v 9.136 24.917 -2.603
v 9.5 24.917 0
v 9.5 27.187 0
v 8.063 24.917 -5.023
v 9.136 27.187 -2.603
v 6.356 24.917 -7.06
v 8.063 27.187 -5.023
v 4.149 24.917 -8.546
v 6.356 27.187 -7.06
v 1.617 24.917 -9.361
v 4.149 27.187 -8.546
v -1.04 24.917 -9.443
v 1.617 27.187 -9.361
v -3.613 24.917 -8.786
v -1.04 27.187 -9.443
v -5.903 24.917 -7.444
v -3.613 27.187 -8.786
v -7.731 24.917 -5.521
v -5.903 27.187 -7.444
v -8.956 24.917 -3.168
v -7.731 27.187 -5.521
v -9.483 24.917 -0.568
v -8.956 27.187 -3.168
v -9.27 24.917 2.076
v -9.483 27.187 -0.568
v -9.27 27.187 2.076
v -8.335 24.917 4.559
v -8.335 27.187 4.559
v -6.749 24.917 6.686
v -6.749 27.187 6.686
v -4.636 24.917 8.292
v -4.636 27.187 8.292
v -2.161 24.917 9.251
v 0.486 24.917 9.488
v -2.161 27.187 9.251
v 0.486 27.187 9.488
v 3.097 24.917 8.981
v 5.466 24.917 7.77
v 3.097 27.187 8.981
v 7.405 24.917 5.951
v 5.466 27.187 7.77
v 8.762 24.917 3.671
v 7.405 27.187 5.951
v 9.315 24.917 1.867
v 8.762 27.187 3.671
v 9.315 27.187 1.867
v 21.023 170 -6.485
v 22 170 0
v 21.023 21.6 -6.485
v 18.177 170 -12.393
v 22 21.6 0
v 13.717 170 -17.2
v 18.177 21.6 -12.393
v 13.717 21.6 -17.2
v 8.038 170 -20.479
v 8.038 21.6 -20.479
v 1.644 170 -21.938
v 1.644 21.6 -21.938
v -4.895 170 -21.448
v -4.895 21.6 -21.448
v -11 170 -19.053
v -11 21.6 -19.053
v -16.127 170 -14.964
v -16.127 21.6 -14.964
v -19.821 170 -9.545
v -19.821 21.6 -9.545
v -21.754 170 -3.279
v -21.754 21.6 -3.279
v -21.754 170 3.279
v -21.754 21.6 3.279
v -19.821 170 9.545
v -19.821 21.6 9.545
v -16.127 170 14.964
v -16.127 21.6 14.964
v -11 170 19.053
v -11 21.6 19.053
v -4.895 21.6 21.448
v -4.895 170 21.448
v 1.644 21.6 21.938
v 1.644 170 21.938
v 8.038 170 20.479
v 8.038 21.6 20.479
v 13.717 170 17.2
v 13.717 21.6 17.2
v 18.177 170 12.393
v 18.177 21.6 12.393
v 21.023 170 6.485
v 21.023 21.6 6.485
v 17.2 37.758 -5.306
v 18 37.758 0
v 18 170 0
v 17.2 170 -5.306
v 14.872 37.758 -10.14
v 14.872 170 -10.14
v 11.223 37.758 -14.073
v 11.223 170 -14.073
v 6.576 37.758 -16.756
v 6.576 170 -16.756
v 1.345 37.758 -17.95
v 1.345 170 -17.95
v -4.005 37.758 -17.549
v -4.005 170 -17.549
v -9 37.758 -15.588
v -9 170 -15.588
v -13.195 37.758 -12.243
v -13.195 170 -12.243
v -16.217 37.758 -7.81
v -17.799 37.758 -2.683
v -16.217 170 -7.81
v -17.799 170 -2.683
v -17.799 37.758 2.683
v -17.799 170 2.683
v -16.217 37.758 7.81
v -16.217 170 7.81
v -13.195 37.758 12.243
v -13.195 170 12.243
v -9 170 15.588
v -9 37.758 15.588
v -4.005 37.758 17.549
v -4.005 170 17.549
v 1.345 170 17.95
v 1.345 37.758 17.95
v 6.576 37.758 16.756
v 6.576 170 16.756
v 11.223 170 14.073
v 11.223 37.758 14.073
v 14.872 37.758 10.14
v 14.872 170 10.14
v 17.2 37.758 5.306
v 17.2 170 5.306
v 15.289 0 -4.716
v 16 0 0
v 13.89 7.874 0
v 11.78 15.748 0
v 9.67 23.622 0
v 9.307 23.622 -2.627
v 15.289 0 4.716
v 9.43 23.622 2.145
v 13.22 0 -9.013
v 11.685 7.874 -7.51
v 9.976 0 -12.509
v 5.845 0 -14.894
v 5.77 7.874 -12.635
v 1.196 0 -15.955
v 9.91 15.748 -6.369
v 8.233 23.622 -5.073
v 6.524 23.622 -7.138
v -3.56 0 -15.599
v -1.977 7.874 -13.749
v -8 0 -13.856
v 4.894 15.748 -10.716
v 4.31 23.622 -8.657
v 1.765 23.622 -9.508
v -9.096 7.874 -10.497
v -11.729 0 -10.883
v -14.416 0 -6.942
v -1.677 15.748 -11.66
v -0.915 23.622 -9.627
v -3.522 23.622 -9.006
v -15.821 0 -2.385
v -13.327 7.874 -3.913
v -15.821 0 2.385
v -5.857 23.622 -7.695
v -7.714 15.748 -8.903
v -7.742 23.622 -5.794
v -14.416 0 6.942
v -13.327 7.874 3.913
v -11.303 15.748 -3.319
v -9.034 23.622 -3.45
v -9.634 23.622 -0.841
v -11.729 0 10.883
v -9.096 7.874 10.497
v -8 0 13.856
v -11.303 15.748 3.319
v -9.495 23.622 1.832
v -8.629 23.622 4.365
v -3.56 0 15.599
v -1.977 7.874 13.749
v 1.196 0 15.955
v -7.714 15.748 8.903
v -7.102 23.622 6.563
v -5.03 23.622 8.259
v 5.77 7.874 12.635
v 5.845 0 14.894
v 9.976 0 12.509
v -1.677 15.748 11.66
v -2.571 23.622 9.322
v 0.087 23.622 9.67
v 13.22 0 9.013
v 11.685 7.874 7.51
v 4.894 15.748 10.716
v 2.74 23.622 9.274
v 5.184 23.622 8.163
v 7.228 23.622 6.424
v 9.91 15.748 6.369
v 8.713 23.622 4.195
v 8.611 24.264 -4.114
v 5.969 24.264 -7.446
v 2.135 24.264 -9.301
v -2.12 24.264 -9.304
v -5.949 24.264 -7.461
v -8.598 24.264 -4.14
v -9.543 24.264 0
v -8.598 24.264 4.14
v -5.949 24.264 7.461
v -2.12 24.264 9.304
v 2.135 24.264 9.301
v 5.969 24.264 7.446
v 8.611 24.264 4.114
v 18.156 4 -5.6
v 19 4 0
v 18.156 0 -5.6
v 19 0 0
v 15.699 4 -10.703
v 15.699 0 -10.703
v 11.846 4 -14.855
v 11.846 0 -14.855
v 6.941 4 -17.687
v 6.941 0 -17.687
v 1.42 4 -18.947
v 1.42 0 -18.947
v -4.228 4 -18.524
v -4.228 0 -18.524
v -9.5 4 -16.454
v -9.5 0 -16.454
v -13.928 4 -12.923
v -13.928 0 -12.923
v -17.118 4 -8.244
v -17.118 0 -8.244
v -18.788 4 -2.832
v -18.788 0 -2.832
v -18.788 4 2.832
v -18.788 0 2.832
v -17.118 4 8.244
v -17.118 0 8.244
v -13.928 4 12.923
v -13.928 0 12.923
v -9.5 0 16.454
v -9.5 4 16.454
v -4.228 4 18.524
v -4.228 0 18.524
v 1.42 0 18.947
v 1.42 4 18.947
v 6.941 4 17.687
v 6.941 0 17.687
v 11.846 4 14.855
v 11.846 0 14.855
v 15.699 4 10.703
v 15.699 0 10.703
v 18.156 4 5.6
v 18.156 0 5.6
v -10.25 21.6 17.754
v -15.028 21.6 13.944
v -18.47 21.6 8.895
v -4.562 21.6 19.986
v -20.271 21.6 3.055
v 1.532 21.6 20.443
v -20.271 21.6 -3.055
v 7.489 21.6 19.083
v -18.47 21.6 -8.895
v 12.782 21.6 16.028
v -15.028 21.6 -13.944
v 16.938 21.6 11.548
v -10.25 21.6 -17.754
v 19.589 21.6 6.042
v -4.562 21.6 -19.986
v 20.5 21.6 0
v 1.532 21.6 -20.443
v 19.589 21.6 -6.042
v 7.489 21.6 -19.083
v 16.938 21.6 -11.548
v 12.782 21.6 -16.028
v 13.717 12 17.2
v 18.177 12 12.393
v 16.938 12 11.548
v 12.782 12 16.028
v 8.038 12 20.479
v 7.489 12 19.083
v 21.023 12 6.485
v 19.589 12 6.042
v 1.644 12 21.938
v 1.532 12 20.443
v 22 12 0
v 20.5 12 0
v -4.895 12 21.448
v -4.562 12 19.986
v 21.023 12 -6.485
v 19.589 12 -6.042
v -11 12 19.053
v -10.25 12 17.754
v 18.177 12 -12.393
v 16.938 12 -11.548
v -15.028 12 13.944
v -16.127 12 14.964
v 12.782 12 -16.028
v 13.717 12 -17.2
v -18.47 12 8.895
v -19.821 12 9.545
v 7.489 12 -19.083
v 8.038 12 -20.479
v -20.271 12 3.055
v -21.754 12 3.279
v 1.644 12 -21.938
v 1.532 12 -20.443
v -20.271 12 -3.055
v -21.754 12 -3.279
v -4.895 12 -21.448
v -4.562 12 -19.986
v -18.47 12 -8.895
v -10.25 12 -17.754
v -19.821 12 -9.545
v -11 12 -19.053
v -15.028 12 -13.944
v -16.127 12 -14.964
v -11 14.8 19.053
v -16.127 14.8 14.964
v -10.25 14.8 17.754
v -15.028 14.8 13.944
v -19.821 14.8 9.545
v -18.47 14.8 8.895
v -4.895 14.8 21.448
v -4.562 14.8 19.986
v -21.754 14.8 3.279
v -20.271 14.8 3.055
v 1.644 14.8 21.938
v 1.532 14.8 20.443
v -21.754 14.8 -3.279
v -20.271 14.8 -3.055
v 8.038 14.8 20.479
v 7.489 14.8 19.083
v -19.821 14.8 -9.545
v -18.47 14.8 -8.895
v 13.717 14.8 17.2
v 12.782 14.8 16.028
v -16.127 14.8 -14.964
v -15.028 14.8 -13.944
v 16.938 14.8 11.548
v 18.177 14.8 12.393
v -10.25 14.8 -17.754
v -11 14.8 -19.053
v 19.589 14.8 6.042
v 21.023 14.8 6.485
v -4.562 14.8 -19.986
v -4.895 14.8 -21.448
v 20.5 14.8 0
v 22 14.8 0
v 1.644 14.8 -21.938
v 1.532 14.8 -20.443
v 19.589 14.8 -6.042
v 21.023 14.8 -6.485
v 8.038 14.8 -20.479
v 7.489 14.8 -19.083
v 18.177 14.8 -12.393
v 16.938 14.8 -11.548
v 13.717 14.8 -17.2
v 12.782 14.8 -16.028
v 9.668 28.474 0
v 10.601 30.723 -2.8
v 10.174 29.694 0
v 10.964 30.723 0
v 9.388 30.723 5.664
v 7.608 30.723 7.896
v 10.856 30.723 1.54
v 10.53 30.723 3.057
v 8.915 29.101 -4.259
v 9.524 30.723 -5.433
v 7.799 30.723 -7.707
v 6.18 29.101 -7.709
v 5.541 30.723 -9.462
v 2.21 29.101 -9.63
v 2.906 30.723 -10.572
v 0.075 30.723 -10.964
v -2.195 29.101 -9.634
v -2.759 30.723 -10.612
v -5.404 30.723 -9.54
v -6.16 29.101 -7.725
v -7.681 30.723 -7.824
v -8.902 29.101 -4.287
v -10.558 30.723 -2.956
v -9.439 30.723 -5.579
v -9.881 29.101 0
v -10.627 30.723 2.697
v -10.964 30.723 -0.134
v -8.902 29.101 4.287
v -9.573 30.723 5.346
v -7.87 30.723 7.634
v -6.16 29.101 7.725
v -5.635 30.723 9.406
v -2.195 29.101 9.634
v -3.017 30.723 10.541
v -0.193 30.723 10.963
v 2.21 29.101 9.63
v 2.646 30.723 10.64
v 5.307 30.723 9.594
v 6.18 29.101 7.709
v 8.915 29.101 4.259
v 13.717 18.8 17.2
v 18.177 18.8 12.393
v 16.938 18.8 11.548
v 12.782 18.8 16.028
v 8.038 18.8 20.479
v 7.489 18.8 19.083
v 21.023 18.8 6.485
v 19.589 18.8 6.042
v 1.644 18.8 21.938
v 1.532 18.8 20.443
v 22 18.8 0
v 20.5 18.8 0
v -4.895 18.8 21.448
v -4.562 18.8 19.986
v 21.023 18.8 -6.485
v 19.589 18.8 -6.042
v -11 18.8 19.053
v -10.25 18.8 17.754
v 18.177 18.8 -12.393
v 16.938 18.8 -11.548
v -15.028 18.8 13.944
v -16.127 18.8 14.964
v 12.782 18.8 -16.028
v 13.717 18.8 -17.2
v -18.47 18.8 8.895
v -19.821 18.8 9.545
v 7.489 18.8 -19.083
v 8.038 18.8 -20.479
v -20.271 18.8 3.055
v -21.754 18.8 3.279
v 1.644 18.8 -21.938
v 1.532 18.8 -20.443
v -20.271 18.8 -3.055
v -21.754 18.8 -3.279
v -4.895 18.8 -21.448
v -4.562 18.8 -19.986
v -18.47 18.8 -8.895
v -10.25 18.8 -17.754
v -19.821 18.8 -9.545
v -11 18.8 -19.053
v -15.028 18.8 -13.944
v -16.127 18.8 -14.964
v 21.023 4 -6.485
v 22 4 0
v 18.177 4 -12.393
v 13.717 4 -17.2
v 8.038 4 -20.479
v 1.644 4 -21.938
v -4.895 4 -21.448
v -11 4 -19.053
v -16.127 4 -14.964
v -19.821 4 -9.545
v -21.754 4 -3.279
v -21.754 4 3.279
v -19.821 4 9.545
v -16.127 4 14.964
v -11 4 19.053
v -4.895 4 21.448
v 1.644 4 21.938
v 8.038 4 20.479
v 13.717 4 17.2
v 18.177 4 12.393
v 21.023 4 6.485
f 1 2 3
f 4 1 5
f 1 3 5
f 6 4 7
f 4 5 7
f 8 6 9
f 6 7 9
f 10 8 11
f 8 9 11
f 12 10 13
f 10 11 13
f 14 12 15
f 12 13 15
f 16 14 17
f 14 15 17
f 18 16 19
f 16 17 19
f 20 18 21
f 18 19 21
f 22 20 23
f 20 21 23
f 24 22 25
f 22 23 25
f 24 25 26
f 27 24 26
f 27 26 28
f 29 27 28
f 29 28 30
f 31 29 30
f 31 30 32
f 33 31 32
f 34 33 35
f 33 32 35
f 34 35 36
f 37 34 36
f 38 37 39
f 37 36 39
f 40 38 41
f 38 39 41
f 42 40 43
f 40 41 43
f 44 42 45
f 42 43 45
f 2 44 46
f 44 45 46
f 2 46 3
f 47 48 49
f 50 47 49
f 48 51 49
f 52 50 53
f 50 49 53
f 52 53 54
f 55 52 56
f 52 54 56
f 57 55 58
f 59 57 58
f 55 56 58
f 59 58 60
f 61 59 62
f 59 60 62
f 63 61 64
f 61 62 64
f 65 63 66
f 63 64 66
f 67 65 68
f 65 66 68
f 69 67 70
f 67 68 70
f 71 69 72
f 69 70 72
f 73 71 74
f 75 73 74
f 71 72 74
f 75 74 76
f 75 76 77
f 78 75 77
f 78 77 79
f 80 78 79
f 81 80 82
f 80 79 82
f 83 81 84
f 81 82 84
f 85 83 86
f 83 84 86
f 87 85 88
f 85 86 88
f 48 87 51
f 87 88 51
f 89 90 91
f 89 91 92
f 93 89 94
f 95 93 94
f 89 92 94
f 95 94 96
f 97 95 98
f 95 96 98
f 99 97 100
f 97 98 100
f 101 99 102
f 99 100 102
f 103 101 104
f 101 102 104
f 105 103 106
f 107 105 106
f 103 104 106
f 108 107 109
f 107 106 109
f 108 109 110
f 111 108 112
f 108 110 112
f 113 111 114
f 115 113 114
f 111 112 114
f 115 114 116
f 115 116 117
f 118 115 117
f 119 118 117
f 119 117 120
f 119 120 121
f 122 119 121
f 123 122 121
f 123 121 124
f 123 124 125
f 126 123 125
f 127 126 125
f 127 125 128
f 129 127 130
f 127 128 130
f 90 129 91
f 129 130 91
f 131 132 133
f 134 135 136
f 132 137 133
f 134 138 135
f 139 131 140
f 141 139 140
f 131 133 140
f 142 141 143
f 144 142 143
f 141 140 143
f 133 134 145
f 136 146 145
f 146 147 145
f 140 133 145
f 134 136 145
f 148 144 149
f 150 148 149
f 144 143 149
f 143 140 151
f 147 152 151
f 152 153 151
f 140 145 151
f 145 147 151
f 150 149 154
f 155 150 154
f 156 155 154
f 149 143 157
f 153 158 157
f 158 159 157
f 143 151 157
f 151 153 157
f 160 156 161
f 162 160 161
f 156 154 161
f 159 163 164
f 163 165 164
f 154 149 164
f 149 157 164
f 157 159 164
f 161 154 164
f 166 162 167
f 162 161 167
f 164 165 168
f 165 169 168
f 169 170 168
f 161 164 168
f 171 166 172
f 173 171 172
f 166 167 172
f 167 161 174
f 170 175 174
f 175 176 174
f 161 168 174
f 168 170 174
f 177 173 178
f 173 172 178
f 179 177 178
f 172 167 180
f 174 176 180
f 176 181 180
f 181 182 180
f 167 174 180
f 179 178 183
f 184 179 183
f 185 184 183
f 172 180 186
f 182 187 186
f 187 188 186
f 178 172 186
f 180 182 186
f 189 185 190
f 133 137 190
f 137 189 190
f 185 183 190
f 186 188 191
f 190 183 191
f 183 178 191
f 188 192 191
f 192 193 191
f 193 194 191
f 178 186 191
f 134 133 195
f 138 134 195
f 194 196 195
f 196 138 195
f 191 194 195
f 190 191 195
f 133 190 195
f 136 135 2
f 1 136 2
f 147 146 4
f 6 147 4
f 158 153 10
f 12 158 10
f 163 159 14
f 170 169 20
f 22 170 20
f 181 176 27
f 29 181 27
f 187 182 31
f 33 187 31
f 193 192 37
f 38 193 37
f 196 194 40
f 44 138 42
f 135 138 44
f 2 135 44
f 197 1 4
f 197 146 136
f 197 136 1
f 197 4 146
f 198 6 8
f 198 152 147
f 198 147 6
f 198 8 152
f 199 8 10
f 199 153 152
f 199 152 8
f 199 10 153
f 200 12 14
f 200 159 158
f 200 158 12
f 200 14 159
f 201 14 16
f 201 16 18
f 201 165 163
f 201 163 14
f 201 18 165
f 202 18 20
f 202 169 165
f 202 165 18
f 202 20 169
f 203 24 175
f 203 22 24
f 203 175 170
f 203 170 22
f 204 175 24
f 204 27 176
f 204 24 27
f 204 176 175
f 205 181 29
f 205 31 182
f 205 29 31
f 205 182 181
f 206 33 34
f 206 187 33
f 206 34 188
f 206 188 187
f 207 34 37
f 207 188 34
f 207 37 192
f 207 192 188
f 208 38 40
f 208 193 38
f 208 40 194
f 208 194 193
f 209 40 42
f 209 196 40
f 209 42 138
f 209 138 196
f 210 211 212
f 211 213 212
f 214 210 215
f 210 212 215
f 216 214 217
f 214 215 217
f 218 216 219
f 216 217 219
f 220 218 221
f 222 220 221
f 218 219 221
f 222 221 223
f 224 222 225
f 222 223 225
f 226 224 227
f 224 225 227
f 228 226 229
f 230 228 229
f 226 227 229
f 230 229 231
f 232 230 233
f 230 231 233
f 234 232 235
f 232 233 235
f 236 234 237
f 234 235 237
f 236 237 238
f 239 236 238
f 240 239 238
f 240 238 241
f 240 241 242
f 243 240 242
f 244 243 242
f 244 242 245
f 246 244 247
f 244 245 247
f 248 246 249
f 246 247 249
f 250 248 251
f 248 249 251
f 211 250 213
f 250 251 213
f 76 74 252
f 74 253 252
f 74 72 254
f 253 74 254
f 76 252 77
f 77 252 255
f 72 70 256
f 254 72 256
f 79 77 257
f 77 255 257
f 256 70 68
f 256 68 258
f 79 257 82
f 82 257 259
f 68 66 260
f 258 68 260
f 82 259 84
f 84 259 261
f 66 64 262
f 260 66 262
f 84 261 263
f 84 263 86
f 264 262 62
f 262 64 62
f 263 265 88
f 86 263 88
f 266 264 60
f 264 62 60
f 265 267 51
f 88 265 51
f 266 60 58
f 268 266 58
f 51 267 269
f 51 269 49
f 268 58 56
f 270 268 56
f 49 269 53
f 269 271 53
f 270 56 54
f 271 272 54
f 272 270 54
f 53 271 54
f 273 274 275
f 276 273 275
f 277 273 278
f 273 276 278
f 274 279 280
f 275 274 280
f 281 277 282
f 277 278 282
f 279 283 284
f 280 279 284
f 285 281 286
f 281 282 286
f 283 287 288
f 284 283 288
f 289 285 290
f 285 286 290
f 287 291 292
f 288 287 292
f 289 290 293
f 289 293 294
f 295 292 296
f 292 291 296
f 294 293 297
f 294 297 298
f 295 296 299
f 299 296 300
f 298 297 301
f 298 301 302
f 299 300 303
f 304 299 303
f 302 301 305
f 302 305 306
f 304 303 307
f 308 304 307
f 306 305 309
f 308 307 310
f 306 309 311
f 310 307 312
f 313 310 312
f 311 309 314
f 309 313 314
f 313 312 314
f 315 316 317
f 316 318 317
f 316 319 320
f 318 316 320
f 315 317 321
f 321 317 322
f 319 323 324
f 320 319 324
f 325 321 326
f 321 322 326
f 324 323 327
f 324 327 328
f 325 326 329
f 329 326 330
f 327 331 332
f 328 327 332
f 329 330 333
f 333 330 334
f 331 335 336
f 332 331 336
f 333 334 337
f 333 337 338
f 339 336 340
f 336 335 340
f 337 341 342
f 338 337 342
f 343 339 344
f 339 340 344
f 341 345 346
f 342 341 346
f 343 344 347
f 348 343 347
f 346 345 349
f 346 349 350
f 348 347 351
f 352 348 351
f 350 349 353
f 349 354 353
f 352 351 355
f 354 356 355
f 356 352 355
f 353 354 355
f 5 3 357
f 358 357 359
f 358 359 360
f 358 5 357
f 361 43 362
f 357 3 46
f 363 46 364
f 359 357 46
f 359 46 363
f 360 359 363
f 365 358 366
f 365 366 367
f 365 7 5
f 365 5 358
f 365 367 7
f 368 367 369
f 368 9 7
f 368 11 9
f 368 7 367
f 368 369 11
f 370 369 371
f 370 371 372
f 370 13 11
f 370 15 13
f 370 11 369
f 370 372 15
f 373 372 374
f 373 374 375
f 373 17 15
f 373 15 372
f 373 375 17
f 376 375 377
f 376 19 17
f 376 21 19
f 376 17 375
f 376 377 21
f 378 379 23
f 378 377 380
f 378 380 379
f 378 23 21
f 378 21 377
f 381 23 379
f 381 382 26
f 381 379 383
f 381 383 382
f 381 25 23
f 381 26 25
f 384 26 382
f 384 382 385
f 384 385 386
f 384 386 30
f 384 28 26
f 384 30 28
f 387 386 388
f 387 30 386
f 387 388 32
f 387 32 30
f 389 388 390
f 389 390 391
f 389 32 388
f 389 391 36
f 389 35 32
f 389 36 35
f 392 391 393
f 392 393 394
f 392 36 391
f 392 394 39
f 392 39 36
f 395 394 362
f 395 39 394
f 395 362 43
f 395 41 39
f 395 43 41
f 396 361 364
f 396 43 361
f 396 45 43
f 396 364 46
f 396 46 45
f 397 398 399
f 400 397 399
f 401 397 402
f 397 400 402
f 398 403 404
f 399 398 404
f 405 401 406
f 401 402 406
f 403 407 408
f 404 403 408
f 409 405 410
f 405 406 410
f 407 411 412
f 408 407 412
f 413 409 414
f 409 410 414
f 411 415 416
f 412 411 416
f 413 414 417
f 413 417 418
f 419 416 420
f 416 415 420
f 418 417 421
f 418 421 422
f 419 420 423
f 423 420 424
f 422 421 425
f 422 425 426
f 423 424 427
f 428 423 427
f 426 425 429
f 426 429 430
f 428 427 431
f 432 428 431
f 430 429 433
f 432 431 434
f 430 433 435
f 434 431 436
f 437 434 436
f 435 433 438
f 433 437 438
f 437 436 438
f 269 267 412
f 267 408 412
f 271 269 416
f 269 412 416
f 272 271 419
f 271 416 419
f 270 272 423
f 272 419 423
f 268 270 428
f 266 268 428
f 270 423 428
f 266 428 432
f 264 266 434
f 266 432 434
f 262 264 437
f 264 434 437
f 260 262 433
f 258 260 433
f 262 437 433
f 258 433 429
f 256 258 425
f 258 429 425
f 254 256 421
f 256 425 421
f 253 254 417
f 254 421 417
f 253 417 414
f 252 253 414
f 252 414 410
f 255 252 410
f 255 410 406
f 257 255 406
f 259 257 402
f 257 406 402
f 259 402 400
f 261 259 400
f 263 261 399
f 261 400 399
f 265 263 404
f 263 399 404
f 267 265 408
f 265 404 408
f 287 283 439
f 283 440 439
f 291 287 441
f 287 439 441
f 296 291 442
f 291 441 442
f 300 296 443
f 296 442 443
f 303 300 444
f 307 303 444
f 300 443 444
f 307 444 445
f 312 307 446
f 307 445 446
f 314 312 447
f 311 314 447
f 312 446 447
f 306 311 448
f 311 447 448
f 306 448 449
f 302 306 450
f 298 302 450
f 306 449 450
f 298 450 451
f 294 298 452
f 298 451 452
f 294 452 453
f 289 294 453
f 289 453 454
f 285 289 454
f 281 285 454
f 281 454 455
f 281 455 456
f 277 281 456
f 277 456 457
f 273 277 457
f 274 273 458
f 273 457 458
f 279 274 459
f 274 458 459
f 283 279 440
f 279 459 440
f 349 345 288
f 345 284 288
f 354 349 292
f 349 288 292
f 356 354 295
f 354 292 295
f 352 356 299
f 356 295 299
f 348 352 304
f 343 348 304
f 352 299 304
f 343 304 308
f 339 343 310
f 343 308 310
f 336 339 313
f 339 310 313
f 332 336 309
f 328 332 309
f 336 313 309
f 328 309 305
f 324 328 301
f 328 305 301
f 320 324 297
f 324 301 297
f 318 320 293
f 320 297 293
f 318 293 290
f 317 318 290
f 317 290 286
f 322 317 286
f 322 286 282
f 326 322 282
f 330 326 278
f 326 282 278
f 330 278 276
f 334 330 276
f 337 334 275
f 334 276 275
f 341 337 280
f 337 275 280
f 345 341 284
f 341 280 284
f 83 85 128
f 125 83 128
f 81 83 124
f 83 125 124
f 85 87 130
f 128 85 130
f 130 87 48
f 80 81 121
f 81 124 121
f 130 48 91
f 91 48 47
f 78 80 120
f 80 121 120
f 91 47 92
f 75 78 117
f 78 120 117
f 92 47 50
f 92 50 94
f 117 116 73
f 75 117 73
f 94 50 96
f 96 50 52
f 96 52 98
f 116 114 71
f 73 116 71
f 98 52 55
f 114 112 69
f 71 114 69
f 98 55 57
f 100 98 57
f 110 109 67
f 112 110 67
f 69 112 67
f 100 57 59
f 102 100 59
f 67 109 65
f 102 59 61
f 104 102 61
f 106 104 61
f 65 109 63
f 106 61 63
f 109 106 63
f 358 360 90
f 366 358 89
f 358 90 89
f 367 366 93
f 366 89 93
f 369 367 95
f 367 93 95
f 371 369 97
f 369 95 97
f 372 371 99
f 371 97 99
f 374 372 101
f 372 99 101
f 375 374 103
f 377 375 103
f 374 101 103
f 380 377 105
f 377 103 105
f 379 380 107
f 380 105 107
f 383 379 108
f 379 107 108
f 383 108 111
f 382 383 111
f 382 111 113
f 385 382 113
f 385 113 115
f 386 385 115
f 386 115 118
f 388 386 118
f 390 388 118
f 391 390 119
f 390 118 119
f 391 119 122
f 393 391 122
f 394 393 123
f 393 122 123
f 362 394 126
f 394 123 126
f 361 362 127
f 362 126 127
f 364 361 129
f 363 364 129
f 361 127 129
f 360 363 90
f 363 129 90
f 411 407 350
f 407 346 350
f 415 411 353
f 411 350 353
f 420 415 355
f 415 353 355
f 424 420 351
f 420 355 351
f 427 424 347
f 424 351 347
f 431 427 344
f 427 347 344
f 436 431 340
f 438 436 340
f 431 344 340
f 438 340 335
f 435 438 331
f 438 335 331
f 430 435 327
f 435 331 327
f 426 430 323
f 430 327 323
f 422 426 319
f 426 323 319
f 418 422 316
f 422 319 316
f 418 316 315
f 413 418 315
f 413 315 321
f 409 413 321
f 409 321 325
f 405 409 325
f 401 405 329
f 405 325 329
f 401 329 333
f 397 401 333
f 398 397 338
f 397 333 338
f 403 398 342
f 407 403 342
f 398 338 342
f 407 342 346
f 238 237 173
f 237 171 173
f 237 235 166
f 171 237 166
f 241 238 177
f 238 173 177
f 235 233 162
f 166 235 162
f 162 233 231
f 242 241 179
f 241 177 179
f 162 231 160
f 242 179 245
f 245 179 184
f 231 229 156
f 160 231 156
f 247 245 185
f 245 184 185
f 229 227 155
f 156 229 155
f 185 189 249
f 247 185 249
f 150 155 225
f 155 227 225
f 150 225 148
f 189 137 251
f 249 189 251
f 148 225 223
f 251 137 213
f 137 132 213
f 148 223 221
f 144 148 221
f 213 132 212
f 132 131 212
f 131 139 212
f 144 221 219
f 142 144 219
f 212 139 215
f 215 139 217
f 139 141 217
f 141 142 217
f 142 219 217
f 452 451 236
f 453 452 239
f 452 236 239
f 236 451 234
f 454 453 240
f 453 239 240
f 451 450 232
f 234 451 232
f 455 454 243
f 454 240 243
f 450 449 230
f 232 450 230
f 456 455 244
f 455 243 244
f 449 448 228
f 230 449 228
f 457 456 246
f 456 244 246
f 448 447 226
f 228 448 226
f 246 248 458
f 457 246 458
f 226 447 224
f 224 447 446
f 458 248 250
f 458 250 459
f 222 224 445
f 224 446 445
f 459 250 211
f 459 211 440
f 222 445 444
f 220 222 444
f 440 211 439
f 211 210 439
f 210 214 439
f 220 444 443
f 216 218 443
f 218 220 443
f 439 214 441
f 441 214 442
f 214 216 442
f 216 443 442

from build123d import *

# Parameters (mm, degrees)
FILLET1_R = 5


with BuildPart() as part:
    # Sketch1 → Revolve1 (revolve)
    with BuildSketch(Plane.XY):
        Polygon((16, 0), (9.5, 24.258330249), (9.5, 29.258330249), (18, 37.758330249), (18, 170), (22, 170), (22, 21.6), (20.5, 21.6), (20.5, 18.8), (22, 18.8), (22, 14.8), (20.5, 14.8), (20.5, 12), (22, 12), (22, 4), (19, 4), (19, 0), align=None)
    revolve(axis=Axis((0, 0, 0), (0, 1, 0)))

    # Fillet1
    fillet1_edges = [part.edges().sort_by_distance(p)[0] for p in [
        (-9.5, 29.258330249, 0),
        (-9.5, 24.258330249, 0),
    ]]
    fillet(fillet1_edges, radius=FILLET1_R)


solid = part.part
